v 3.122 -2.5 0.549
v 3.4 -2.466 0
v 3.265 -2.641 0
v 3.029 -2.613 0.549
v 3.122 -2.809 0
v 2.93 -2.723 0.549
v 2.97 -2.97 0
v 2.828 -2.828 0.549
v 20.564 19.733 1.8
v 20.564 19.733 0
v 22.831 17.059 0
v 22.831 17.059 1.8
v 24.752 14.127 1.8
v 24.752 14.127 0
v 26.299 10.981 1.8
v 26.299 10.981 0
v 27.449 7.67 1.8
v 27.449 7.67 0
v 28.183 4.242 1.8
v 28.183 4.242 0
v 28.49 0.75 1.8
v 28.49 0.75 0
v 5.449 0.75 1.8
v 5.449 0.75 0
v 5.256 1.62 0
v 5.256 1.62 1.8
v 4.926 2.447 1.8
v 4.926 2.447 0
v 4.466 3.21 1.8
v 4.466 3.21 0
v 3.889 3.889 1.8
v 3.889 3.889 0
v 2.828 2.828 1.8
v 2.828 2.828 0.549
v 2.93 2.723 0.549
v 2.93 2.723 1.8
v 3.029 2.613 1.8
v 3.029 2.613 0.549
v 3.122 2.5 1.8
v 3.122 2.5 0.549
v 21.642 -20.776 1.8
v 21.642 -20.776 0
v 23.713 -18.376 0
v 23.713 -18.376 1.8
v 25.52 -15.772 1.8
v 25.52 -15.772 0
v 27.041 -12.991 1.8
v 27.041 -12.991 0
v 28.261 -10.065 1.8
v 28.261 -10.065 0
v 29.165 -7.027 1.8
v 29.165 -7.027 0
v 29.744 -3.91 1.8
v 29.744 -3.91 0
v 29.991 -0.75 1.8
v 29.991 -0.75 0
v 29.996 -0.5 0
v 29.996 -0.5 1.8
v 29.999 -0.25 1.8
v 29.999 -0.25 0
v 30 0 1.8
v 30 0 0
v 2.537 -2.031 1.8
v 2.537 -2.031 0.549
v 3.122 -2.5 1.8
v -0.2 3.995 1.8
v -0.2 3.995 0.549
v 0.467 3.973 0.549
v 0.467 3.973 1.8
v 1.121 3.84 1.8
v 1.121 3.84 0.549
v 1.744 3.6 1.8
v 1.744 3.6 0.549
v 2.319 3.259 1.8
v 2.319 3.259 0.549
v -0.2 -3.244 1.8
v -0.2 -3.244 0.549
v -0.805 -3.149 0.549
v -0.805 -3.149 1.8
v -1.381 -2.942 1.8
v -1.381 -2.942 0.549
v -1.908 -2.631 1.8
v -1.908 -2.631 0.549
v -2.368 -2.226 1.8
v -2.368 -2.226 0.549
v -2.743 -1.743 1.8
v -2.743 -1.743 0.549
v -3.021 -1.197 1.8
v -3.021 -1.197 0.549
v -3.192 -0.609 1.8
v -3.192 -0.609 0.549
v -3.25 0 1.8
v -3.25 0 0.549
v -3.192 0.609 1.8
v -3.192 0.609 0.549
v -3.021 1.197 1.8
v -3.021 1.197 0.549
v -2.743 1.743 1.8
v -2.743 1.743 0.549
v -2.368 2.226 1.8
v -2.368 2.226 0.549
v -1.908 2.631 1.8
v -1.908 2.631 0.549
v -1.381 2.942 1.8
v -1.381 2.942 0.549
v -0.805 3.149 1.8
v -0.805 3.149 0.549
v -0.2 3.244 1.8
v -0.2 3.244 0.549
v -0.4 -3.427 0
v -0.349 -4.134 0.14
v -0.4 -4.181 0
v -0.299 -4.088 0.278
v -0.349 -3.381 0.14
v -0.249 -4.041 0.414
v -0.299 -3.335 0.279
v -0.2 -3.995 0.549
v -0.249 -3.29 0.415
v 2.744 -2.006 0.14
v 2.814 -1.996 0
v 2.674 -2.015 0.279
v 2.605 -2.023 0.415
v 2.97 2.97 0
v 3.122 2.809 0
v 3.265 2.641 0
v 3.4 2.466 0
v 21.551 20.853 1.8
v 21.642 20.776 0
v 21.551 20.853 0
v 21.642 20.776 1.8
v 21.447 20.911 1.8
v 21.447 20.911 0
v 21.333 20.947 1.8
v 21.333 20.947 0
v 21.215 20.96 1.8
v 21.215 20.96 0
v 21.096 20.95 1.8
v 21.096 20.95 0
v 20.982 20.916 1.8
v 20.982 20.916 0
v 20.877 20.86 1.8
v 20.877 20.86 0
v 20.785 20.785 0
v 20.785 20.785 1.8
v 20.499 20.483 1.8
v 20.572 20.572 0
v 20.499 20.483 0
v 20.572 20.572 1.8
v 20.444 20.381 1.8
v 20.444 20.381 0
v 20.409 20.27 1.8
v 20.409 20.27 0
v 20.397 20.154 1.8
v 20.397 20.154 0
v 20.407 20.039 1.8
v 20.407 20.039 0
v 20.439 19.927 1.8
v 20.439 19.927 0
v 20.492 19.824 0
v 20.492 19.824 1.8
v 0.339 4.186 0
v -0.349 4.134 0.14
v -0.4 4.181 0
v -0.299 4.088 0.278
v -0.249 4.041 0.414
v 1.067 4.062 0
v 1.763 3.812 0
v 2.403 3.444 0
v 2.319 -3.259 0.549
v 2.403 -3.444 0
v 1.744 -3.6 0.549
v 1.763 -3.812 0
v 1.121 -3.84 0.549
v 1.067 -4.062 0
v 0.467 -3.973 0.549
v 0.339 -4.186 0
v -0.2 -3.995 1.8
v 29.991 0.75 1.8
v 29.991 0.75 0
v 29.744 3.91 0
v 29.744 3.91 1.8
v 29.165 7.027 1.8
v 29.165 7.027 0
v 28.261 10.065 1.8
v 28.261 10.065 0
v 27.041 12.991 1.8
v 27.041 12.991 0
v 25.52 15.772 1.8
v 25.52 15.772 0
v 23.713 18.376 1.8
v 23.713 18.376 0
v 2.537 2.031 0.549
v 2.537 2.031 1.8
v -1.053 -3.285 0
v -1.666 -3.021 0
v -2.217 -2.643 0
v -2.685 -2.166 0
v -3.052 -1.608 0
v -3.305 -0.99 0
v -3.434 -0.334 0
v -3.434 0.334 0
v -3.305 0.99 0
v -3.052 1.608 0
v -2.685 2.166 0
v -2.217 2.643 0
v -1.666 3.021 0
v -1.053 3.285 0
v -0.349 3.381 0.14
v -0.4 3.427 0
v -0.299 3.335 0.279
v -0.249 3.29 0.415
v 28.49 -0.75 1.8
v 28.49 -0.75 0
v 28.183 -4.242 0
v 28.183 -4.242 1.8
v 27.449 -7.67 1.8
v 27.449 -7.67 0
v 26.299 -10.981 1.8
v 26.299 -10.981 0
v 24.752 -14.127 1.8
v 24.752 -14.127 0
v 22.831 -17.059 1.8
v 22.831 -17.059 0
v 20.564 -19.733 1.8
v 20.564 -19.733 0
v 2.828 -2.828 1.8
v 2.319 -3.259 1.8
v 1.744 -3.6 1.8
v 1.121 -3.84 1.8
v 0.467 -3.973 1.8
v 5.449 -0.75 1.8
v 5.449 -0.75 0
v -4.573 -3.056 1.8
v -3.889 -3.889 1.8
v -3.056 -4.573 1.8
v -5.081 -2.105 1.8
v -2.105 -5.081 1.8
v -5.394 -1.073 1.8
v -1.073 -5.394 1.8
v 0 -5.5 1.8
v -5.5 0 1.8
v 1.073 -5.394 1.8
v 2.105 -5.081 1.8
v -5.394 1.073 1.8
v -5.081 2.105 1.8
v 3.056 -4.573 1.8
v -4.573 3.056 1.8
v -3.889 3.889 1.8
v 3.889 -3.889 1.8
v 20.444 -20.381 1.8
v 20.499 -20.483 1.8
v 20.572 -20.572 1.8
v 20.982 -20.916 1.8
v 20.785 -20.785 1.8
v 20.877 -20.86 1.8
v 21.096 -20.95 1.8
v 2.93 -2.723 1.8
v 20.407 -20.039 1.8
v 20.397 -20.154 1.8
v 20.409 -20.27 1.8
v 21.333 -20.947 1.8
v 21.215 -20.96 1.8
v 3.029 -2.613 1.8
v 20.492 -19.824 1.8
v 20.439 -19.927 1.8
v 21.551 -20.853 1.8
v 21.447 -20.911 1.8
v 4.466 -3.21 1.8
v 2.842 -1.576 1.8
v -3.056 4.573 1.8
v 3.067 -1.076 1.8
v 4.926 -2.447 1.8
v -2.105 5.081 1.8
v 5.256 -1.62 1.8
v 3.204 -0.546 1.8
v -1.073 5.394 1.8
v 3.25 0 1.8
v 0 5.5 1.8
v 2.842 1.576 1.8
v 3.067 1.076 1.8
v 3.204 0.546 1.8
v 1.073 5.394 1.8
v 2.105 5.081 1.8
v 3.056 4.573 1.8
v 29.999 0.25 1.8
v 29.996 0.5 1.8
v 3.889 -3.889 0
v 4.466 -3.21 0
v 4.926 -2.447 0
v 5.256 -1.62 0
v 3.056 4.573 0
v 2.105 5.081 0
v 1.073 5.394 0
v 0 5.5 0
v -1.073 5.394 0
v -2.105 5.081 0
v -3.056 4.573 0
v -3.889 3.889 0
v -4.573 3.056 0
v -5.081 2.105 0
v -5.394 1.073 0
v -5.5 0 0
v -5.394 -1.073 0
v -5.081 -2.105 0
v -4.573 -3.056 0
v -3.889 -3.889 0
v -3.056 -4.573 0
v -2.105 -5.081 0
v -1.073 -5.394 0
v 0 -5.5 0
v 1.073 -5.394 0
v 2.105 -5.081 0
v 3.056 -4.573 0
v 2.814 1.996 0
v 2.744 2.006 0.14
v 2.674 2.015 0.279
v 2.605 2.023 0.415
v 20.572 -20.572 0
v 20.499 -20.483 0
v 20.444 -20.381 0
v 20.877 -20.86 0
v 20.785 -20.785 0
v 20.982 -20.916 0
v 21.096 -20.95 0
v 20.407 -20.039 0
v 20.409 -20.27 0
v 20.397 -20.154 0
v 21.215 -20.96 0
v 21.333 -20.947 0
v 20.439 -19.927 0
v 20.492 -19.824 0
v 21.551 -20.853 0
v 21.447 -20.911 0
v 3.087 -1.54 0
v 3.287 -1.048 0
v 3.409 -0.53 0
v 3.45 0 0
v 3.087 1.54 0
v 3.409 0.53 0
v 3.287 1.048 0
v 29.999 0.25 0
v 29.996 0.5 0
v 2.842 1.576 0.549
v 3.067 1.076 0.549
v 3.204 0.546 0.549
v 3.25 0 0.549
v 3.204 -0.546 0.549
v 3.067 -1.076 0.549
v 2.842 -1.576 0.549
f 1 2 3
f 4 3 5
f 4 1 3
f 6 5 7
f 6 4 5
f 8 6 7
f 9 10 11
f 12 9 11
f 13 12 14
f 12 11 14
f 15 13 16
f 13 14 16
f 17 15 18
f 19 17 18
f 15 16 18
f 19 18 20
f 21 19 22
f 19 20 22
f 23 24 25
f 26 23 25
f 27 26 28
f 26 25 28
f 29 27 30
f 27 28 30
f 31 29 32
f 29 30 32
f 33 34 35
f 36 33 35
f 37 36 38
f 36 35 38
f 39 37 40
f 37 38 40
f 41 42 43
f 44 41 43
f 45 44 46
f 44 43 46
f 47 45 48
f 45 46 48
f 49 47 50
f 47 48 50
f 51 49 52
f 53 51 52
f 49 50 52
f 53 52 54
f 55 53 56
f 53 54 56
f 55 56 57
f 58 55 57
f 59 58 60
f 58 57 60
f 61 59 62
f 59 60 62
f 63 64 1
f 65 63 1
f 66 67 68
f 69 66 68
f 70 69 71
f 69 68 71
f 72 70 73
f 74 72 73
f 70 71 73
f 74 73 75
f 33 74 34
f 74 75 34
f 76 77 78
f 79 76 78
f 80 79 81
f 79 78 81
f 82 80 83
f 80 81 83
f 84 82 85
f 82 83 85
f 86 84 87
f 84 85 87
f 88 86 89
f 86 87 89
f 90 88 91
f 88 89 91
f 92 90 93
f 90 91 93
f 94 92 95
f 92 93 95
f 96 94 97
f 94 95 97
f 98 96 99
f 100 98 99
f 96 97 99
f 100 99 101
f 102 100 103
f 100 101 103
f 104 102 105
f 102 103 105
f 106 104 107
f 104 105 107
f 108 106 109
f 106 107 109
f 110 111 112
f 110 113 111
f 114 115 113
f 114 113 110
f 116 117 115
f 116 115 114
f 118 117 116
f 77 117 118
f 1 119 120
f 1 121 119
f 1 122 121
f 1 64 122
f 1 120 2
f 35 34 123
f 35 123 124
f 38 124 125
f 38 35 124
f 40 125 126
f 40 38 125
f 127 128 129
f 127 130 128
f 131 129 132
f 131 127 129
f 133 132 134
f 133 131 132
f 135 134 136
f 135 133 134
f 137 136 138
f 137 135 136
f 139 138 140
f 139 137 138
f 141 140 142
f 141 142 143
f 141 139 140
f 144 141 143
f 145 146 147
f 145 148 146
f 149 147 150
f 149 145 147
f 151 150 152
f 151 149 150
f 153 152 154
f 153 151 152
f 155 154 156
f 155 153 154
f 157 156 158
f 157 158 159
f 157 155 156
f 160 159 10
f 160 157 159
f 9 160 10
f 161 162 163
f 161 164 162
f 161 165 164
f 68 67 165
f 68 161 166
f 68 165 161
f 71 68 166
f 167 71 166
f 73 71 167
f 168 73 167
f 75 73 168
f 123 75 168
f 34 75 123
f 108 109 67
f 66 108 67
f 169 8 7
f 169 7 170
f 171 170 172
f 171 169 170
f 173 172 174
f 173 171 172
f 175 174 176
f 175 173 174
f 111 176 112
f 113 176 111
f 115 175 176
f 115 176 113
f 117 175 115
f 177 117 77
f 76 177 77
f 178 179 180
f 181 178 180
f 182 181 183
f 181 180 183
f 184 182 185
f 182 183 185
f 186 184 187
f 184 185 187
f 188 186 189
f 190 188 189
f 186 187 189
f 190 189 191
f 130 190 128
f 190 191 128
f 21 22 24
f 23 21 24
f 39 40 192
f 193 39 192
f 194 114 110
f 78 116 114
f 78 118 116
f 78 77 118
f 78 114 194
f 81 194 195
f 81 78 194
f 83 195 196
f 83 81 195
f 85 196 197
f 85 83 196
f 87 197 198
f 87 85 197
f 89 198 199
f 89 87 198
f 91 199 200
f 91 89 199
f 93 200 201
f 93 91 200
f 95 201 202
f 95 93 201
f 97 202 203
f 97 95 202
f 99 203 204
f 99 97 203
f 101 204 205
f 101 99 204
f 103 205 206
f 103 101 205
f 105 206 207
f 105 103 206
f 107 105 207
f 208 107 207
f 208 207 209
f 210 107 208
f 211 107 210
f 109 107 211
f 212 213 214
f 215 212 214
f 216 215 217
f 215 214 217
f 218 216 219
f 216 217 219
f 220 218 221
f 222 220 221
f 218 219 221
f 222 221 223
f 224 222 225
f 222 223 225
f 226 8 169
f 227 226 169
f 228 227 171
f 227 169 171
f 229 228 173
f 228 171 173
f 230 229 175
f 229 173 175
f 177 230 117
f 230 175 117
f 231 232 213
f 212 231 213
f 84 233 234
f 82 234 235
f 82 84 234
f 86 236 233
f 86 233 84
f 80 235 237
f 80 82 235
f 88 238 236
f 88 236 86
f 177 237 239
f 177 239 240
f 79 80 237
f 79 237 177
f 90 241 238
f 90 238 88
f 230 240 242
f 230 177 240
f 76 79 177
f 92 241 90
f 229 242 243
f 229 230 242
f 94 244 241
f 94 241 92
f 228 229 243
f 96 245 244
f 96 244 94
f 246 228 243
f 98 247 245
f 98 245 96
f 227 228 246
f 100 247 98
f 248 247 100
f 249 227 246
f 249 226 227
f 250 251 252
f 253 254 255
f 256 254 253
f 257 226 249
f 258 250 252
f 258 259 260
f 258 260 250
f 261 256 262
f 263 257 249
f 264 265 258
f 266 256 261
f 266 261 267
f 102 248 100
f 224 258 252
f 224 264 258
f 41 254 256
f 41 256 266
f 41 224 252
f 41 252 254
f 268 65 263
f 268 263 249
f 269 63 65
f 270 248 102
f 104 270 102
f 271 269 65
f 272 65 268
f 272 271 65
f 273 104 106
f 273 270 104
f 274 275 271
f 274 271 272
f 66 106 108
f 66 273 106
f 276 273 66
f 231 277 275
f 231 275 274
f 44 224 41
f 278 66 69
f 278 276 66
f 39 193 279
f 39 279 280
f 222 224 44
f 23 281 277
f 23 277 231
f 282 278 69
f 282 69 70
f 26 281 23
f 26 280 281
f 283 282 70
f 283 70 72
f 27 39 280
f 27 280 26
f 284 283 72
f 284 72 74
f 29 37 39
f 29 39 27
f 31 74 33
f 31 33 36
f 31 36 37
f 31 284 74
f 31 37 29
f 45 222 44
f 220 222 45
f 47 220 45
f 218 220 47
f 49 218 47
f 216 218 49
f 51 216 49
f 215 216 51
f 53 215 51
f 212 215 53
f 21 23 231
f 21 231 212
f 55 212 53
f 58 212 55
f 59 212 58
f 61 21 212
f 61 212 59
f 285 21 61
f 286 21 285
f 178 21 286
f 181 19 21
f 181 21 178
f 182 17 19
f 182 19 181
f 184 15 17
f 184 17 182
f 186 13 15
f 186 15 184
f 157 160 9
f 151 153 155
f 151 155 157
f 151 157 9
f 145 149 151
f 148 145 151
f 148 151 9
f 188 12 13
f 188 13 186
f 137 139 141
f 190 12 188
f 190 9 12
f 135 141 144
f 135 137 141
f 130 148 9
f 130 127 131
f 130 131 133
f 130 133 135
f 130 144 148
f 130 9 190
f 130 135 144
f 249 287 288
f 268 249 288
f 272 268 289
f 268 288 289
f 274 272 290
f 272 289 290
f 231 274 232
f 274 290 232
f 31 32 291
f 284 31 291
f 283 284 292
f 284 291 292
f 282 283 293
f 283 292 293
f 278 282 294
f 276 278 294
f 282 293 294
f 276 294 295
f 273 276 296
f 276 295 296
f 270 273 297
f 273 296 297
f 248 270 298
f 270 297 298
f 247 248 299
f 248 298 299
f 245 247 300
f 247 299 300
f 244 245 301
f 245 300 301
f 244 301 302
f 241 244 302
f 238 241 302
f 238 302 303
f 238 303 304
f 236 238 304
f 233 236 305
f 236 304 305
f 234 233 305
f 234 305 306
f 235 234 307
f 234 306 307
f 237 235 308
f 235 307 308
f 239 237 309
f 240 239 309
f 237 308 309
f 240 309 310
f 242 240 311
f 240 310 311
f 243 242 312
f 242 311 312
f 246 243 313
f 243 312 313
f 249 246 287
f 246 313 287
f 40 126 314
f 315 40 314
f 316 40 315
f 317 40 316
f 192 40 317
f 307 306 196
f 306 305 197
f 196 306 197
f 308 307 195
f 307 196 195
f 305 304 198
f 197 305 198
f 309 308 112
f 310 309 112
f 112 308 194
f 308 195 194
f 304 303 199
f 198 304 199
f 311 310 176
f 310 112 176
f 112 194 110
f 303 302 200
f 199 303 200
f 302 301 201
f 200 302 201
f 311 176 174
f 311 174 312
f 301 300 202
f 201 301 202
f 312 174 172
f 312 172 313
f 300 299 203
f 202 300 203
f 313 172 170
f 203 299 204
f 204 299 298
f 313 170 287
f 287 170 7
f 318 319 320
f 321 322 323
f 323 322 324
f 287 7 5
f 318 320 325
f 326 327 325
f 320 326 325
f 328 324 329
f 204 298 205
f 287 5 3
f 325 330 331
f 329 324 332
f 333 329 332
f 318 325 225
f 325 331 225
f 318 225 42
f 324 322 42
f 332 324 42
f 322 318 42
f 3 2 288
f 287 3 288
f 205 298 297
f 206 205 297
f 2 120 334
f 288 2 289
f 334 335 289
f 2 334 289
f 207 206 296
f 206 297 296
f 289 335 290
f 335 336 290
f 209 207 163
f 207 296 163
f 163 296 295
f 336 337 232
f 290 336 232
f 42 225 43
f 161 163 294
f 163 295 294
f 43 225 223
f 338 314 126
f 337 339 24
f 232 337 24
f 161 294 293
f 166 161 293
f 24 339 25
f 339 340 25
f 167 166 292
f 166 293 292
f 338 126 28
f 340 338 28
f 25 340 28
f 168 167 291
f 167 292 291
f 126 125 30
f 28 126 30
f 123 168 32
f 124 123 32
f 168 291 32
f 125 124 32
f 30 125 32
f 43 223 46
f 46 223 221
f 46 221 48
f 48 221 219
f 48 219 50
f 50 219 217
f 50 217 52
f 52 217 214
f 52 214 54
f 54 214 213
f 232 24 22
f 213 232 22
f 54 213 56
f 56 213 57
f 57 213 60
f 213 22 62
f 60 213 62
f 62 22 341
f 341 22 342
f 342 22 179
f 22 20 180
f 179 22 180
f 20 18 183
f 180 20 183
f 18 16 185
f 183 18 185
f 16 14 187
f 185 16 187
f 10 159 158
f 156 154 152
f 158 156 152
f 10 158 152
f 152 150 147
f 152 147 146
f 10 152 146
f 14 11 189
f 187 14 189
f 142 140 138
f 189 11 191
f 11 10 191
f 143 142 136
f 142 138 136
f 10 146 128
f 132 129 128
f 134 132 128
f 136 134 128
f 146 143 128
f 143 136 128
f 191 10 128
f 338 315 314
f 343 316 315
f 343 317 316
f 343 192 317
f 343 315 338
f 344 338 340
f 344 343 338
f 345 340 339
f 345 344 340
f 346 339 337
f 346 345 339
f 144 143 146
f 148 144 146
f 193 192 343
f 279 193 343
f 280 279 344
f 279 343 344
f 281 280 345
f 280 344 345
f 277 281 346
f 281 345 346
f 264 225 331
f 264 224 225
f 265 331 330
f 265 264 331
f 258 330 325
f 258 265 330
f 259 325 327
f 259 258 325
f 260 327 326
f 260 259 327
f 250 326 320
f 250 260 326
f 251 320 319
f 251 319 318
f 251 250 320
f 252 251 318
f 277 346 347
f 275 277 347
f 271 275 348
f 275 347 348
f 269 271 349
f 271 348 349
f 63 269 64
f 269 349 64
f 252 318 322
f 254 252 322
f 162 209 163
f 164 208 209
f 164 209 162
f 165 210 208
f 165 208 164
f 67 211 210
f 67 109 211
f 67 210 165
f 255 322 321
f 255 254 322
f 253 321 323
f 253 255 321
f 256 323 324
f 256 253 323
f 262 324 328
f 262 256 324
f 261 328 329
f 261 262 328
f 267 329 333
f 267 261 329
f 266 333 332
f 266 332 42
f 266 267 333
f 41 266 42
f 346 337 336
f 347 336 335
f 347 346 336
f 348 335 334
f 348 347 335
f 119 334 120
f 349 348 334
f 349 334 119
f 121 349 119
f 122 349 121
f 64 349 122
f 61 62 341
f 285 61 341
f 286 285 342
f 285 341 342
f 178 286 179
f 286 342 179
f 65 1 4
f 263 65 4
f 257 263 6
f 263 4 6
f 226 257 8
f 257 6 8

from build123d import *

# Parameters (mm, degrees)
F1_DEPTH = 1.8
F2_R     = 0.6
F3_SIZE2 = 0.5494954839
F3_SIZE  = 0.2


with BuildPart() as f1:
    # F0 (on Top) → F1 (new body)
    with BuildSketch(Plane.XY):
        with BuildLine():
            Line((29.9906235347, 0.75), (28.4901298698, 0.75))
            ThreePointArc((28.4901298698, 0.75), (28.4975323606, 0.3750324718), (28.5, 0))
            ThreePointArc((28.5, 0), (28.4975323606, -0.3750324718), (28.4901298698, -0.75))
            Line((28.4901298698, -0.75), (29.9906235347, -0.75))
            Line((29.9906235347, -0.75), (29.9906235347, 0.75))
        make_face()
        with BuildLine():
            Line((21.2132034356, 21.2132034356), (20.1525432638, 20.1525432638))
            ThreePointArc((20.1525432638, 20.1525432638), (26.1847681615, 11.2520183224), (28.4901298698, 0.75))
            Line((28.4901298698, 0.75), (29.9906235347, 0.75))
            ThreePointArc((29.9906235347, 0.75), (27.570702708, 11.8260877803), (21.2132034356, 21.2132034356))
        make_face()
        with BuildLine():
            Line((28.4901298698, 0.75), (5.4486236794, 0.75))
            ThreePointArc((5.4486236794, 0.75), (5.4871408874, 0.3758788124), (5.5, 0))
            ThreePointArc((5.5, 0), (5.4871408874, -0.3758788124), (5.4486236794, -0.75))
            Line((5.4486236794, -0.75), (28.4901298698, -0.75))
            ThreePointArc((28.4901298698, -0.75), (28.4975323606, -0.3750324718), (28.5, 0))
            ThreePointArc((28.5, 0), (28.4975323606, 0.3750324718), (28.4901298698, 0.75))
        make_face()
        with BuildLine():
            ThreePointArc((28.4901298698, -0.75), (26.1847681615, -11.2520183224), (20.1525432638, -20.1525432638))
            Line((20.1525432638, -20.1525432638), (21.2132034356, -21.2132034356))
            ThreePointArc((21.2132034356, -21.2132034356), (27.570702708, -11.8260877803), (29.9906235347, -0.75))
            Line((29.9906235347, -0.75), (28.4901298698, -0.75))
        make_face()
        with BuildLine():
            ThreePointArc((3.1224989992, 2.5), (3.7742546282, 1.3247648854), (4, 0))
            ThreePointArc((4, 0), (3.7742546282, -1.3247648854), (3.1224989992, -2.5))
            ThreePointArc((3.1224989992, -2.5), (2.979991028, -2.6682678787), (2.8284271247, -2.8284271247))
            Line((2.8284271247, -2.8284271247), (3.8890872965, -3.8890872965))
            ThreePointArc((3.8890872965, -3.8890872965), (4.9256145638, -2.4471046501), (5.4486236794, -0.75))
            Line((5.4486236794, -0.75), (5.4486236794, 0.75))
            ThreePointArc((5.4486236794, 0.75), (4.9256145638, 2.4471046501), (3.8890872965, 3.8890872965))
            Line((3.8890872965, 3.8890872965), (2.8284271247, 2.8284271247))
            ThreePointArc((2.8284271247, 2.8284271247), (2.979991028, 2.6682678787), (3.1224989992, 2.5))
        make_face()
        with BuildLine():
            ThreePointArc((3.1224989992, -2.5), (3.7742546282, -1.3247648854), (4, 0))
            ThreePointArc((4, 0), (3.7742546282, 1.3247648854), (3.1224989992, 2.5))
            Line((3.1224989992, 2.5), (2.5370304368, 2.03125))
            ThreePointArc((2.5370304368, 2.03125), (3.0665818854, 1.0763714694), (3.25, 0))
            ThreePointArc((3.25, 0), (3.0665818854, -1.0763714694), (2.5370304368, -2.03125))
            Line((2.5370304368, -2.03125), (3.1224989992, -2.5))
        make_face()
        with BuildLine():
            Line((-0.2, 3.2438403167), (-0.2, 3.9949968711))
            ThreePointArc((-0.2, 3.9949968711), (-4, 0), (-0.2, -3.9949968711))
            Line((-0.2, -3.9949968711), (-0.2, -3.2438403167))
            ThreePointArc((-0.2, -3.2438403167), (-3.25, 0), (-0.2, 3.2438403167))
        make_face()
        with BuildLine():
            ThreePointArc((-0.2, 3.9949968711), (1.4378381449, 3.7326426924), (2.8284271247, 2.8284271247))
            Line((2.8284271247, 2.8284271247), (3.8890872965, 3.8890872965))
            ThreePointArc((3.8890872965, 3.8890872965), (-5.5, 0), (3.8890872965, -3.8890872965))
            Line((3.8890872965, -3.8890872965), (2.8284271247, -2.8284271247))
            ThreePointArc((2.8284271247, -2.8284271247), (1.4378381449, -3.7326426924), (-0.2, -3.9949968711))
            ThreePointArc((-0.2, -3.9949968711), (-4, 0), (-0.2, 3.9949968711))
        make_face()
        with BuildLine():
            ThreePointArc((5.5, 0), (5.4871408874, 0.3758788124), (5.4486236794, 0.75))
            Line((5.4486236794, 0.75), (5.4486236794, -0.75))
            ThreePointArc((5.4486236794, -0.75), (5.4871408874, -0.3758788124), (5.5, 0))
        make_face()
        with BuildLine():
            ThreePointArc((30, 0), (29.9976557921, 0.3750293049), (29.9906235347, 0.75))
            Line((29.9906235347, 0.75), (29.9906235347, -0.75))
            ThreePointArc((29.9906235347, -0.75), (29.9976557921, -0.3750293049), (30, 0))
        make_face()
    extrude(amount=F1_DEPTH)

    # F2
    f2_edges = [f1.edges().sort_by_distance(p)[0] for p in [
        (21.213203, -21.213203, 0.9),
        (20.152543, -20.152543, 0.9),
        (21.213203, 21.213203, 0.9),
        (20.152543, 20.152543, 0.9),
    ]]
    fillet(f2_edges, radius=F2_R)

    # F3
    f3_edges = [f1.edges().sort_by_distance(p)[0] for p in [
        (-3.25, 0, 0),
        (-0.2, 3.619419, 0),
        (1.641342, 3.647738, 0),
        (3.25, 0, 0),
        (2.829765, 2.265625, 0),
        (2.829765, -2.265625, 0),
        (1.641342, -3.647738, 0),
        (-0.2, -3.619419, 0),
    ]]
    f3_side = f1.faces().sort_by_distance((14.942774, 0, 0))[0]
    chamfer(f3_edges, length=F3_SIZE, length2=F3_SIZE2, reference=f3_side)


solid = f1.part
